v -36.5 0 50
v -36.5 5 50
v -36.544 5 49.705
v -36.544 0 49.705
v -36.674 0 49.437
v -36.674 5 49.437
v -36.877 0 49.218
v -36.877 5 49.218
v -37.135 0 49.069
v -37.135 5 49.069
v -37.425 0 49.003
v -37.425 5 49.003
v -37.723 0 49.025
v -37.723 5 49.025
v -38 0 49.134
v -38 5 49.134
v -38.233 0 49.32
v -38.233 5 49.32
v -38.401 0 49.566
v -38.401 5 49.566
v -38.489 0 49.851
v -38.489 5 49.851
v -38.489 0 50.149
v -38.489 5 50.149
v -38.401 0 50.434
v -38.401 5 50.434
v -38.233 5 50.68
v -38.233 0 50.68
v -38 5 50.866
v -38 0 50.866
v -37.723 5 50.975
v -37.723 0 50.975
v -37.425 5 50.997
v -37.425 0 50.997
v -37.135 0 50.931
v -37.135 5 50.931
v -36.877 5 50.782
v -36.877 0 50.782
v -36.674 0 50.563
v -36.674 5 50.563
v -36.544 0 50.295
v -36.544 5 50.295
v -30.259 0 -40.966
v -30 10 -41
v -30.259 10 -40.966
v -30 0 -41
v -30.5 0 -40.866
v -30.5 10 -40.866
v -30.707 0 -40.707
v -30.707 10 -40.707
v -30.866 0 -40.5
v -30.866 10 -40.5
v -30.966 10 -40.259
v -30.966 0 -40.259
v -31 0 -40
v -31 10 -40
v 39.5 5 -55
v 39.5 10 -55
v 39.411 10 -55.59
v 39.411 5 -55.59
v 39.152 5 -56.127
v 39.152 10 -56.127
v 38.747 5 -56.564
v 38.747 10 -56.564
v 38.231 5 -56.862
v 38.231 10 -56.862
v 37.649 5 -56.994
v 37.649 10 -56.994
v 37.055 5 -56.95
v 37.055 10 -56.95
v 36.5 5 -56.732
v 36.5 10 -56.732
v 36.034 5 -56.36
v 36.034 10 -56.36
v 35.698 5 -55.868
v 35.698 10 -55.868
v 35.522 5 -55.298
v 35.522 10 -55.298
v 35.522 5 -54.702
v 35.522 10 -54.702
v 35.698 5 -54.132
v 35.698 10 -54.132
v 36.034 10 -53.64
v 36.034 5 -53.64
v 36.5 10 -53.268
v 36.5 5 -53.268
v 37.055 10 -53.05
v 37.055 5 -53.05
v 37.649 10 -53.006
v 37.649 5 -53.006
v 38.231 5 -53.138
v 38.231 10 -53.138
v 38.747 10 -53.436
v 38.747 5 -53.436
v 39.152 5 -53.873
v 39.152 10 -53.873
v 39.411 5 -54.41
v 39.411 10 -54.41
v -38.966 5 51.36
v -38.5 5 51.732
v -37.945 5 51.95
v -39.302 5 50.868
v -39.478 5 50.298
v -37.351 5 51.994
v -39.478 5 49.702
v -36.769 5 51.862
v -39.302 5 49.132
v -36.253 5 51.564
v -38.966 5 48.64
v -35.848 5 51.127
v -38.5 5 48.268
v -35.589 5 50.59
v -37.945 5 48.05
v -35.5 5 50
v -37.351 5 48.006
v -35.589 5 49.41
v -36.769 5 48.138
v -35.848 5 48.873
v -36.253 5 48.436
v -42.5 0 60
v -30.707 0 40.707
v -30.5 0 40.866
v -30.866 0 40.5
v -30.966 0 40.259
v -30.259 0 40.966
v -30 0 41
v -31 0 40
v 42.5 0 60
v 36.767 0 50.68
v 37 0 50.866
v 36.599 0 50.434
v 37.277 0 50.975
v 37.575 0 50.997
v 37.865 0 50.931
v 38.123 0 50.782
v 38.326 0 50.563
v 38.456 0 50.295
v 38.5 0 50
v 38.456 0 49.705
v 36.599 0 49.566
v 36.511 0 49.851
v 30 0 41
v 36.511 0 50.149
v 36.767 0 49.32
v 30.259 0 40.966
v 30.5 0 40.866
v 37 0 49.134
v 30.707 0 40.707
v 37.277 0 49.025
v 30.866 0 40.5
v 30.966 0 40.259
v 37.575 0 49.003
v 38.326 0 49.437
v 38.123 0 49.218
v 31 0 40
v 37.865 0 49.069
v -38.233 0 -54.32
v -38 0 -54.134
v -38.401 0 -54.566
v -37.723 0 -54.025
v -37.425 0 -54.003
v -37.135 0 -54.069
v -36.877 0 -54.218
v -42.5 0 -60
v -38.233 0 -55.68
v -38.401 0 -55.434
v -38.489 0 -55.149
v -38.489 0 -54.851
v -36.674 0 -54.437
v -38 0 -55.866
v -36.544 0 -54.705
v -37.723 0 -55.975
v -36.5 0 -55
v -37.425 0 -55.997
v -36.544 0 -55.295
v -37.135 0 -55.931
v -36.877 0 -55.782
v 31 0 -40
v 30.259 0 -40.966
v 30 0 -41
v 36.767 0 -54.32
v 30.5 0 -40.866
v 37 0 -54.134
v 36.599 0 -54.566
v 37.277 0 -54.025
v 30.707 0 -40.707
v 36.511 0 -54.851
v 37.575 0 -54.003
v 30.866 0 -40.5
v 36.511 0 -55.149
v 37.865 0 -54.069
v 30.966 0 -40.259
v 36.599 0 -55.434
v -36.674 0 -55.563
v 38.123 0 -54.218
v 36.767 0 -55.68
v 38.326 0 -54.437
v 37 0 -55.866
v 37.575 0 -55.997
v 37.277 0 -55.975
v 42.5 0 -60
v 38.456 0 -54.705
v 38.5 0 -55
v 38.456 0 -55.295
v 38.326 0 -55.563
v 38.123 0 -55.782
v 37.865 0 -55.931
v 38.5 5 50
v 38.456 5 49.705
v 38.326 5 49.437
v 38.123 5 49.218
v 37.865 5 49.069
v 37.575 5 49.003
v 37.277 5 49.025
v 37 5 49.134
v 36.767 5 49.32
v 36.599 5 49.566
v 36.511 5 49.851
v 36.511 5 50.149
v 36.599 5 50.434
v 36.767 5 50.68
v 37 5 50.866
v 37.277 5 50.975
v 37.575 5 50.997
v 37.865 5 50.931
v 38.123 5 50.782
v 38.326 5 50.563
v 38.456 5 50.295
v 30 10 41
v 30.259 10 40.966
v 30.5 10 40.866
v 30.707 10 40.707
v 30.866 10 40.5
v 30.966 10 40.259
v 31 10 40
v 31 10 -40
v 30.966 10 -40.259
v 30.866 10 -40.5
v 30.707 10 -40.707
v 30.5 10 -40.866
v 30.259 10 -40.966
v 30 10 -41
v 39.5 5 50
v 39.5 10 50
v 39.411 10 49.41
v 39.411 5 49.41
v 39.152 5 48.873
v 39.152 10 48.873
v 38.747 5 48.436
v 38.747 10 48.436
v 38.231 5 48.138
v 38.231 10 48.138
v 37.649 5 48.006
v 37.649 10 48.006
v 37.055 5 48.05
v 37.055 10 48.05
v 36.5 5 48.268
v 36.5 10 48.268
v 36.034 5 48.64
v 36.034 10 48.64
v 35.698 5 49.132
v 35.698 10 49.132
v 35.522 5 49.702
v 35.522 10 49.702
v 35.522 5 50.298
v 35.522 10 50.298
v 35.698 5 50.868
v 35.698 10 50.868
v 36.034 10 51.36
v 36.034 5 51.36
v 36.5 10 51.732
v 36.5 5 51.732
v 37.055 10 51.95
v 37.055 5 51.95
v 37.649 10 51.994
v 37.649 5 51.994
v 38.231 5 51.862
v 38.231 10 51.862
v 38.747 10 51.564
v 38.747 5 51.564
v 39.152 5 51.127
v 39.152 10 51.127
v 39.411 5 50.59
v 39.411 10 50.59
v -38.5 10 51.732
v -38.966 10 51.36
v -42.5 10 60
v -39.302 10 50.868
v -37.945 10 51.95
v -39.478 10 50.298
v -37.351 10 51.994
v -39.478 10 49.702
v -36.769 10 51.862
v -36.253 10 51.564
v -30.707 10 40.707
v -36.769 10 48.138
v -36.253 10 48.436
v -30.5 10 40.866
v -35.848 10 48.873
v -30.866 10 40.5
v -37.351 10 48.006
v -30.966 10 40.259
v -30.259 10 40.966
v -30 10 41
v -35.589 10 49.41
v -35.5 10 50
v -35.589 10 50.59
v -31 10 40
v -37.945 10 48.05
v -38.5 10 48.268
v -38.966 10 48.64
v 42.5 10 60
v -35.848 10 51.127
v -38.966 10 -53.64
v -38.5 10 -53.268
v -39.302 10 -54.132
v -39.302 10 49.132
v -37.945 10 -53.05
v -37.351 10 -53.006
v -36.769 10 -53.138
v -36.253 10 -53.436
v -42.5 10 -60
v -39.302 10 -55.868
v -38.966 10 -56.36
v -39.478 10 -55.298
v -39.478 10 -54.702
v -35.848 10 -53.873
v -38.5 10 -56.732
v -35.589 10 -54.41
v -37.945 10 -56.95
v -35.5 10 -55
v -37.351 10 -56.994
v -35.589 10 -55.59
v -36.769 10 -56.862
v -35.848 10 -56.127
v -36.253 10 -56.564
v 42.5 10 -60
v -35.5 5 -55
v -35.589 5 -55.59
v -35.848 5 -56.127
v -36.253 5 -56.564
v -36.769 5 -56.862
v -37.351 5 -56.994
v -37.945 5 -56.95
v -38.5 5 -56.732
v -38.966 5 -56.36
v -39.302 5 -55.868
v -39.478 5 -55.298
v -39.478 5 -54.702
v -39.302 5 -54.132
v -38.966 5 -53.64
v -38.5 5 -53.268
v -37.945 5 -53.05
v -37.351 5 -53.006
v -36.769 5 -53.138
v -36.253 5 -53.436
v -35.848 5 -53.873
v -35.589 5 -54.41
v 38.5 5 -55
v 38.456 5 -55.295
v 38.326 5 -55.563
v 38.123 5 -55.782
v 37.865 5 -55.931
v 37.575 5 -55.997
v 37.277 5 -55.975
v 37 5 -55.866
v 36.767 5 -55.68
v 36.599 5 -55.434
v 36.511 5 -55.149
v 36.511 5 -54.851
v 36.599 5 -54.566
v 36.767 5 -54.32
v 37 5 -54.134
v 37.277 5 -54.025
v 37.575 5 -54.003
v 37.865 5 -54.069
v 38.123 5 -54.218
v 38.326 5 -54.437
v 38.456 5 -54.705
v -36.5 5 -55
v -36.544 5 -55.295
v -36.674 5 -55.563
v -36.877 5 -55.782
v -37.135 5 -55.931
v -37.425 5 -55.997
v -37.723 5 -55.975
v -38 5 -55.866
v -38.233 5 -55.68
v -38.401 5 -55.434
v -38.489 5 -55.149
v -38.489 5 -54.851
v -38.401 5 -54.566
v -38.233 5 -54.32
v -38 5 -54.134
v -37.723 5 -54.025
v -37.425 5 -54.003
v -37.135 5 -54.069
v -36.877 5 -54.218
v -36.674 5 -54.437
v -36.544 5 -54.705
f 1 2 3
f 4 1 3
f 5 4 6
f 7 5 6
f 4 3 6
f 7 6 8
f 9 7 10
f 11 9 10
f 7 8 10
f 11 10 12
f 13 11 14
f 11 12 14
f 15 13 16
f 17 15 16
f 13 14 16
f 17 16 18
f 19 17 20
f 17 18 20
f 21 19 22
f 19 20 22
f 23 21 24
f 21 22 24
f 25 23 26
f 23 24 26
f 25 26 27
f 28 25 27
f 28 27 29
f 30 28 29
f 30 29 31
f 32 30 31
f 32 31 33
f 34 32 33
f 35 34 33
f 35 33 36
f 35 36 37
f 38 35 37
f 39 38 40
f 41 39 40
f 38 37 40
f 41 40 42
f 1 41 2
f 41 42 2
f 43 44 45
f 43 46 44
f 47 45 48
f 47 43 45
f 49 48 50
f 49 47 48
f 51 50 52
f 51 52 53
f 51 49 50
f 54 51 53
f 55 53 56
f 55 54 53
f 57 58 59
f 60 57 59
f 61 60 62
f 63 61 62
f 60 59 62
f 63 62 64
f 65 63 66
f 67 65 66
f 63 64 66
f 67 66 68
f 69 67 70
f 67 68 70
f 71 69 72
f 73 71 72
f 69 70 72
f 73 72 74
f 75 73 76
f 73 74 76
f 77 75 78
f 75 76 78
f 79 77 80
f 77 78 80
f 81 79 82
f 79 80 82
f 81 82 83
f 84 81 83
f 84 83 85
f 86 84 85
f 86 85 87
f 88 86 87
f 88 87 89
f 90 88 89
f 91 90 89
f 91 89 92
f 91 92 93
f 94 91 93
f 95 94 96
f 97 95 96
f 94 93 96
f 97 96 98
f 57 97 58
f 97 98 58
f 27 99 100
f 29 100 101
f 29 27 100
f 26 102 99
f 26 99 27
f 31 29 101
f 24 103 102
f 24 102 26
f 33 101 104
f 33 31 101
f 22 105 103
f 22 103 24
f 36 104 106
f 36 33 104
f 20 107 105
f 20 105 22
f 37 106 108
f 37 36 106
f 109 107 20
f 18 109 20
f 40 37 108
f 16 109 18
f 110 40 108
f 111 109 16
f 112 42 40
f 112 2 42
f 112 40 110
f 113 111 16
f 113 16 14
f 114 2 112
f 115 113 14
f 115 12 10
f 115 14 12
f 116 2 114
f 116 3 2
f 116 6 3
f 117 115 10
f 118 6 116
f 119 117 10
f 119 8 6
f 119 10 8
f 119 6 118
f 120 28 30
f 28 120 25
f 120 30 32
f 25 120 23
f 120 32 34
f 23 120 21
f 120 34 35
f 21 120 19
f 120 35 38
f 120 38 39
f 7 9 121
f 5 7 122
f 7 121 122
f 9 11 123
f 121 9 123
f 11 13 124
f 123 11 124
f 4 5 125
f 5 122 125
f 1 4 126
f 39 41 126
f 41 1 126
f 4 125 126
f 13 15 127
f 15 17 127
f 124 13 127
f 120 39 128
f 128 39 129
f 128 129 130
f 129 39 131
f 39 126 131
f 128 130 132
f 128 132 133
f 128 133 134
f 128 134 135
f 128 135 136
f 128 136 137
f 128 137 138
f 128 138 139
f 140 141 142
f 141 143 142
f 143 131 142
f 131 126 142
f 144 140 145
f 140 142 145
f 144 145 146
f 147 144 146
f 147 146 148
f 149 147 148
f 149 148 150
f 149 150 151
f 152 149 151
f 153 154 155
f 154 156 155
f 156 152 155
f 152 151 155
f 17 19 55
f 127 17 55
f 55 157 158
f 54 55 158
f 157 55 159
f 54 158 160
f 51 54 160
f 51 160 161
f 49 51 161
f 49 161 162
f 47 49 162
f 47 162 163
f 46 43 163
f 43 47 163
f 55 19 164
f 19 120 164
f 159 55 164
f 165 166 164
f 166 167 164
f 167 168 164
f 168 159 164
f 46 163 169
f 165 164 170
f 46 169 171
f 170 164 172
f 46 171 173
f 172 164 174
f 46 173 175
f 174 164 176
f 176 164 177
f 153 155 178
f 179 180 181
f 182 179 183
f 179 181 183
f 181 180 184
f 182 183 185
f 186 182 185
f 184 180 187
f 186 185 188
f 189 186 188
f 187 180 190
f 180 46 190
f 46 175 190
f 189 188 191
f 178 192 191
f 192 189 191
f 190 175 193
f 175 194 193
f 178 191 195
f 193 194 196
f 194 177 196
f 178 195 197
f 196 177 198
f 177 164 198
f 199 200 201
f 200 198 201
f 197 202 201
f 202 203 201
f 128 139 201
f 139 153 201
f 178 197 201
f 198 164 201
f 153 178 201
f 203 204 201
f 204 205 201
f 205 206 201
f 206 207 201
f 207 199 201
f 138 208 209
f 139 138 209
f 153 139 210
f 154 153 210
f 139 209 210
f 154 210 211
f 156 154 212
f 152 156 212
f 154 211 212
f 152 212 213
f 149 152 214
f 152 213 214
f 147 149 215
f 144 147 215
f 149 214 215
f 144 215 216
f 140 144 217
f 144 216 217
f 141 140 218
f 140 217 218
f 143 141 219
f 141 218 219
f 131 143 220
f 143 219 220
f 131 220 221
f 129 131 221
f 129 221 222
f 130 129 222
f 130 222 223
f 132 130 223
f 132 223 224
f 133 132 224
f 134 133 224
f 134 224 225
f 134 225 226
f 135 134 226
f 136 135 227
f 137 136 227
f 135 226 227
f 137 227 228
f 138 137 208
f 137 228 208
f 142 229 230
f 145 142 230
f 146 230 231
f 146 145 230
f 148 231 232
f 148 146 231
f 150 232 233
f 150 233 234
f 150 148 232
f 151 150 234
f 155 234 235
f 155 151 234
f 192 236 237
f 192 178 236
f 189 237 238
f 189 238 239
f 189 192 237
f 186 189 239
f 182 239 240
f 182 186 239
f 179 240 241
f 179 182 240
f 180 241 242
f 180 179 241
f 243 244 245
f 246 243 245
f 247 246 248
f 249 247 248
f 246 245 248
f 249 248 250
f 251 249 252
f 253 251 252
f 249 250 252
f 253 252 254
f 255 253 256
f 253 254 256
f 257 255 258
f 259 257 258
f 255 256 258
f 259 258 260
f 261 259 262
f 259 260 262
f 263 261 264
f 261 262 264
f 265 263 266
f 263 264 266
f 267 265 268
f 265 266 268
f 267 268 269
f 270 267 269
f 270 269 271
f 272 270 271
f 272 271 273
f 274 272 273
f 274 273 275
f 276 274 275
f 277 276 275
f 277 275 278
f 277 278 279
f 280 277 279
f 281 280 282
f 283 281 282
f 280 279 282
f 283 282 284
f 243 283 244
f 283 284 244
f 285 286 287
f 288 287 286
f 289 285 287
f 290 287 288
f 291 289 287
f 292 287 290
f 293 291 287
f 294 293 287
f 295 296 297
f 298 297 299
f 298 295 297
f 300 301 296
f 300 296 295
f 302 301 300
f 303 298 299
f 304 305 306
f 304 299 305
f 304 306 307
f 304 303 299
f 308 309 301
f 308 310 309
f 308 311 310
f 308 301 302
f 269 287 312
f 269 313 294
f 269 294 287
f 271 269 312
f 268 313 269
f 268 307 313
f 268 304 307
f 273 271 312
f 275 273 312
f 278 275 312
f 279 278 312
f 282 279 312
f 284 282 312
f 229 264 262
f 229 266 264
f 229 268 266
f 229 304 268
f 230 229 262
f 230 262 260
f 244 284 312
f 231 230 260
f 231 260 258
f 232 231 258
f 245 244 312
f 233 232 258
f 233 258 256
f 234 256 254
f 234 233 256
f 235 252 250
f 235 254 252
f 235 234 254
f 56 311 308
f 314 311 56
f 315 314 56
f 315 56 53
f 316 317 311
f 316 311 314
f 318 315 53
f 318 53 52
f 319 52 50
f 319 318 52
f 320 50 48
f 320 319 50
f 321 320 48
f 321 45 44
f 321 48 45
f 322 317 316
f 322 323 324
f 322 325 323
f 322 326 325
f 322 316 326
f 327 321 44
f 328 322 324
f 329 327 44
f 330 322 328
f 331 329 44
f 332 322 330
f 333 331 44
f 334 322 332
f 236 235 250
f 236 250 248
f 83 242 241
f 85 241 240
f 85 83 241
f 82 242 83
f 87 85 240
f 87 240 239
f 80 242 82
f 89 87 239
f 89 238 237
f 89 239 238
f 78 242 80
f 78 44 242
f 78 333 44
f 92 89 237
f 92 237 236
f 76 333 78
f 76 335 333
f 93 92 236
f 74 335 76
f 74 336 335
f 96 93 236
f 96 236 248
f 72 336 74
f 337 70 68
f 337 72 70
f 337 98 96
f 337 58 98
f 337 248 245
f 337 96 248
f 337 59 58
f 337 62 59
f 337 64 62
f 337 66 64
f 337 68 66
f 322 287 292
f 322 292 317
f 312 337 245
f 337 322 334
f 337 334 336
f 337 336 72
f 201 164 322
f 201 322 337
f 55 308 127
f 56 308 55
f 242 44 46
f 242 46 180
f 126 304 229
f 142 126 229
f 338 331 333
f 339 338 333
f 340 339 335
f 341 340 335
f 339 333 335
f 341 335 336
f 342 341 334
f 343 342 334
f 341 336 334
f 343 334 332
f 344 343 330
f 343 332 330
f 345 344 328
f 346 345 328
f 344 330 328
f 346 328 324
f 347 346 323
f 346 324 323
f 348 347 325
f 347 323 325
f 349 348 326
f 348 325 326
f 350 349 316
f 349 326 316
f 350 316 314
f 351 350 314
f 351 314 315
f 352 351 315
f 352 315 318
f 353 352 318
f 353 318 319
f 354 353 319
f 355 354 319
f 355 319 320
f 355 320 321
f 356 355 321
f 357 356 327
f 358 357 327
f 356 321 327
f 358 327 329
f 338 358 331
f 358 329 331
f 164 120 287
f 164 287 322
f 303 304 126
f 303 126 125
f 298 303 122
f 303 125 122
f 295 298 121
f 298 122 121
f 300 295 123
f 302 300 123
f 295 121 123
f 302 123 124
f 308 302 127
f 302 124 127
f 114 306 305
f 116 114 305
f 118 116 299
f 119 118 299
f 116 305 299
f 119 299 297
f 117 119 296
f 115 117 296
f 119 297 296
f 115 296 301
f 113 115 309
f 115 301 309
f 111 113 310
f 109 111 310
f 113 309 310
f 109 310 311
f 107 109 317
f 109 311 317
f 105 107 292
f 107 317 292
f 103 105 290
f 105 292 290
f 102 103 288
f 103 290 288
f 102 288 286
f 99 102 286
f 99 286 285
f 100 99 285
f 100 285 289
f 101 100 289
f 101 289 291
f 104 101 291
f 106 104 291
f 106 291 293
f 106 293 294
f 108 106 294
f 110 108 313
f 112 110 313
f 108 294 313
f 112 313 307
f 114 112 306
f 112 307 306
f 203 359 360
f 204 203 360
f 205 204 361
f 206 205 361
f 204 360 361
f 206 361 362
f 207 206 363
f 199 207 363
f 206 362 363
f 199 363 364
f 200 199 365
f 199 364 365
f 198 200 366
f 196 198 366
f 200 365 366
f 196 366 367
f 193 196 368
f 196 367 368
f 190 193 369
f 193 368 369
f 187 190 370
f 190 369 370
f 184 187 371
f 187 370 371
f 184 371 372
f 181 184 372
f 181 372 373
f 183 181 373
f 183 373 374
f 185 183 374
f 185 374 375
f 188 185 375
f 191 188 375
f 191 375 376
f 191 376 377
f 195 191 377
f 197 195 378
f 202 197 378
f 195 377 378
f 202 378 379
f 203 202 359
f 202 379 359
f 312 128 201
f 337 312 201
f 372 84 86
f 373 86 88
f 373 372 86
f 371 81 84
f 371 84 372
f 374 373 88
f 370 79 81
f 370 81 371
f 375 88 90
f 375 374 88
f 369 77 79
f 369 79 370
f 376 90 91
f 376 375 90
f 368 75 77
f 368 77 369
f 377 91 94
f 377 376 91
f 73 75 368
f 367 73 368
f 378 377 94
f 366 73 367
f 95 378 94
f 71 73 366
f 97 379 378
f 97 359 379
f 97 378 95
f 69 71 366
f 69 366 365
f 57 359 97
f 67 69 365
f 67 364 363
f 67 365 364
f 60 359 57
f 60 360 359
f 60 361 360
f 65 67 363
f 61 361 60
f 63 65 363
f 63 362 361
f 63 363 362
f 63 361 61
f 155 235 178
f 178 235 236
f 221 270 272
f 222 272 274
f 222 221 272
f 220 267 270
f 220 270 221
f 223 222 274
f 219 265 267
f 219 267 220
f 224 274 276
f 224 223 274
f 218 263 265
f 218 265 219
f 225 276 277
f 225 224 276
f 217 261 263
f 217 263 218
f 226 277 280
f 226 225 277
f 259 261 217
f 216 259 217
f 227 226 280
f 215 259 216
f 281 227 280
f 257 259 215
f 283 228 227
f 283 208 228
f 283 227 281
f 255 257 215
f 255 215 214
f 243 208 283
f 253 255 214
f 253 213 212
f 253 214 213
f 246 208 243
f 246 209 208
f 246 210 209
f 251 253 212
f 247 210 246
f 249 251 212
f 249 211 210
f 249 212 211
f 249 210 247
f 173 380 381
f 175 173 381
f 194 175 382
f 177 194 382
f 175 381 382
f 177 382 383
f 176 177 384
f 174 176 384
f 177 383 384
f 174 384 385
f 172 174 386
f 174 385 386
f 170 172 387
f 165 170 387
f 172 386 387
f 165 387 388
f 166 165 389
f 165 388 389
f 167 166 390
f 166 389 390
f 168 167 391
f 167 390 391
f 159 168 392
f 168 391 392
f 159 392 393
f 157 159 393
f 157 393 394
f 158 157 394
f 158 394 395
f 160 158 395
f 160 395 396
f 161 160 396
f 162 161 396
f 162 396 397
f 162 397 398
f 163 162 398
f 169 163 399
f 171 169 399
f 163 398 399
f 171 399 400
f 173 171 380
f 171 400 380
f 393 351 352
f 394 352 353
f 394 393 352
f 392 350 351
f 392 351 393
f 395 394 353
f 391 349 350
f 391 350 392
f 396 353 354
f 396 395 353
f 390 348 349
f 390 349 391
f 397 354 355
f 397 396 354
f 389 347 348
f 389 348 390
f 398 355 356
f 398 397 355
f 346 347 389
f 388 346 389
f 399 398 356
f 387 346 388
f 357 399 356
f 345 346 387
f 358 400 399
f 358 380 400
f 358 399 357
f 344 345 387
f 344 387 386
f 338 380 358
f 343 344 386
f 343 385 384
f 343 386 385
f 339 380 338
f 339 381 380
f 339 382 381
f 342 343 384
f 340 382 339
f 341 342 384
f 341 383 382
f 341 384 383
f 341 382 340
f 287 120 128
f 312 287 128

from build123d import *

# Parameters (mm, degrees)
SKETCH1_W           = 85
SKETCH1_H           = 120
BOSS_EXTRUDE1_DEPTH = 10
SKETCH2_W           = 62
SKETCH2_H           = 82
CUT_EXTRUDE1_DEPTH  = 10
FILLET1_R           = 1
SKETCH3_R           = 2
CUT_EXTRUDE2_DEPTH  = 5
SKETCH4_R           = 1
CUT_EXTRUDE3_DEPTH  = 5


with BuildPart() as part:
    # Sketch1 → Boss-Extrude1 (new body)
    with BuildSketch(Plane(origin=(0, 0, 0), x_dir=(1, 0, 0), z_dir=(0, 1, 0))):
        Rectangle(SKETCH1_W, SKETCH1_H)
    extrude(amount=BOSS_EXTRUDE1_DEPTH)

    # Sketch2 → Cut-Extrude1 (cut)
    with BuildSketch(Plane(origin=(0, 10, 0), x_dir=(1, 0, 0), z_dir=(0, 1, 0))):
        Rectangle(SKETCH2_W, SKETCH2_H)
    extrude(amount=-CUT_EXTRUDE1_DEPTH, mode=Mode.SUBTRACT)

    # Fillet1
    fillet1_edges = [part.edges().sort_by_distance(p)[0] for p in [
        (31, 5, -41),
        (31, 5, 41),
        (-31, 5, 41),
        (-31, 5, -41),
    ]]
    fillet(fillet1_edges, radius=FILLET1_R)

    # Sketch3 → Cut-Extrude2 (cut)
    with BuildSketch(Plane(origin=(0, 10, 0), x_dir=(1, 0, 0), z_dir=(0, 1, 0))):
        with Locations((-37.5, -50)):
            Circle(SKETCH3_R)
        with Locations((-37.5, 55)):
            Circle(SKETCH3_R)
        with Locations((37.5, 55)):
            Circle(SKETCH3_R)
        with Locations((37.5, -50)):
            Circle(SKETCH3_R)
    extrude(amount=-CUT_EXTRUDE2_DEPTH, mode=Mode.SUBTRACT)

    # Sketch4 → Cut-Extrude3 (cut)
    with BuildSketch(Plane(origin=(0, 5, 0), x_dir=(1, 0, 0), z_dir=(0, 1, 0))):
        with Locations((-37.5, -50)):
            Circle(SKETCH4_R)
        with Locations((37.5, -50)):
            Circle(SKETCH4_R)
        with Locations((37.5, 55)):
            Circle(SKETCH4_R)
        with Locations((-37.5, 55)):
            Circle(SKETCH4_R)
    extrude(amount=-CUT_EXTRUDE3_DEPTH, mode=Mode.SUBTRACT)


solid = part.part
